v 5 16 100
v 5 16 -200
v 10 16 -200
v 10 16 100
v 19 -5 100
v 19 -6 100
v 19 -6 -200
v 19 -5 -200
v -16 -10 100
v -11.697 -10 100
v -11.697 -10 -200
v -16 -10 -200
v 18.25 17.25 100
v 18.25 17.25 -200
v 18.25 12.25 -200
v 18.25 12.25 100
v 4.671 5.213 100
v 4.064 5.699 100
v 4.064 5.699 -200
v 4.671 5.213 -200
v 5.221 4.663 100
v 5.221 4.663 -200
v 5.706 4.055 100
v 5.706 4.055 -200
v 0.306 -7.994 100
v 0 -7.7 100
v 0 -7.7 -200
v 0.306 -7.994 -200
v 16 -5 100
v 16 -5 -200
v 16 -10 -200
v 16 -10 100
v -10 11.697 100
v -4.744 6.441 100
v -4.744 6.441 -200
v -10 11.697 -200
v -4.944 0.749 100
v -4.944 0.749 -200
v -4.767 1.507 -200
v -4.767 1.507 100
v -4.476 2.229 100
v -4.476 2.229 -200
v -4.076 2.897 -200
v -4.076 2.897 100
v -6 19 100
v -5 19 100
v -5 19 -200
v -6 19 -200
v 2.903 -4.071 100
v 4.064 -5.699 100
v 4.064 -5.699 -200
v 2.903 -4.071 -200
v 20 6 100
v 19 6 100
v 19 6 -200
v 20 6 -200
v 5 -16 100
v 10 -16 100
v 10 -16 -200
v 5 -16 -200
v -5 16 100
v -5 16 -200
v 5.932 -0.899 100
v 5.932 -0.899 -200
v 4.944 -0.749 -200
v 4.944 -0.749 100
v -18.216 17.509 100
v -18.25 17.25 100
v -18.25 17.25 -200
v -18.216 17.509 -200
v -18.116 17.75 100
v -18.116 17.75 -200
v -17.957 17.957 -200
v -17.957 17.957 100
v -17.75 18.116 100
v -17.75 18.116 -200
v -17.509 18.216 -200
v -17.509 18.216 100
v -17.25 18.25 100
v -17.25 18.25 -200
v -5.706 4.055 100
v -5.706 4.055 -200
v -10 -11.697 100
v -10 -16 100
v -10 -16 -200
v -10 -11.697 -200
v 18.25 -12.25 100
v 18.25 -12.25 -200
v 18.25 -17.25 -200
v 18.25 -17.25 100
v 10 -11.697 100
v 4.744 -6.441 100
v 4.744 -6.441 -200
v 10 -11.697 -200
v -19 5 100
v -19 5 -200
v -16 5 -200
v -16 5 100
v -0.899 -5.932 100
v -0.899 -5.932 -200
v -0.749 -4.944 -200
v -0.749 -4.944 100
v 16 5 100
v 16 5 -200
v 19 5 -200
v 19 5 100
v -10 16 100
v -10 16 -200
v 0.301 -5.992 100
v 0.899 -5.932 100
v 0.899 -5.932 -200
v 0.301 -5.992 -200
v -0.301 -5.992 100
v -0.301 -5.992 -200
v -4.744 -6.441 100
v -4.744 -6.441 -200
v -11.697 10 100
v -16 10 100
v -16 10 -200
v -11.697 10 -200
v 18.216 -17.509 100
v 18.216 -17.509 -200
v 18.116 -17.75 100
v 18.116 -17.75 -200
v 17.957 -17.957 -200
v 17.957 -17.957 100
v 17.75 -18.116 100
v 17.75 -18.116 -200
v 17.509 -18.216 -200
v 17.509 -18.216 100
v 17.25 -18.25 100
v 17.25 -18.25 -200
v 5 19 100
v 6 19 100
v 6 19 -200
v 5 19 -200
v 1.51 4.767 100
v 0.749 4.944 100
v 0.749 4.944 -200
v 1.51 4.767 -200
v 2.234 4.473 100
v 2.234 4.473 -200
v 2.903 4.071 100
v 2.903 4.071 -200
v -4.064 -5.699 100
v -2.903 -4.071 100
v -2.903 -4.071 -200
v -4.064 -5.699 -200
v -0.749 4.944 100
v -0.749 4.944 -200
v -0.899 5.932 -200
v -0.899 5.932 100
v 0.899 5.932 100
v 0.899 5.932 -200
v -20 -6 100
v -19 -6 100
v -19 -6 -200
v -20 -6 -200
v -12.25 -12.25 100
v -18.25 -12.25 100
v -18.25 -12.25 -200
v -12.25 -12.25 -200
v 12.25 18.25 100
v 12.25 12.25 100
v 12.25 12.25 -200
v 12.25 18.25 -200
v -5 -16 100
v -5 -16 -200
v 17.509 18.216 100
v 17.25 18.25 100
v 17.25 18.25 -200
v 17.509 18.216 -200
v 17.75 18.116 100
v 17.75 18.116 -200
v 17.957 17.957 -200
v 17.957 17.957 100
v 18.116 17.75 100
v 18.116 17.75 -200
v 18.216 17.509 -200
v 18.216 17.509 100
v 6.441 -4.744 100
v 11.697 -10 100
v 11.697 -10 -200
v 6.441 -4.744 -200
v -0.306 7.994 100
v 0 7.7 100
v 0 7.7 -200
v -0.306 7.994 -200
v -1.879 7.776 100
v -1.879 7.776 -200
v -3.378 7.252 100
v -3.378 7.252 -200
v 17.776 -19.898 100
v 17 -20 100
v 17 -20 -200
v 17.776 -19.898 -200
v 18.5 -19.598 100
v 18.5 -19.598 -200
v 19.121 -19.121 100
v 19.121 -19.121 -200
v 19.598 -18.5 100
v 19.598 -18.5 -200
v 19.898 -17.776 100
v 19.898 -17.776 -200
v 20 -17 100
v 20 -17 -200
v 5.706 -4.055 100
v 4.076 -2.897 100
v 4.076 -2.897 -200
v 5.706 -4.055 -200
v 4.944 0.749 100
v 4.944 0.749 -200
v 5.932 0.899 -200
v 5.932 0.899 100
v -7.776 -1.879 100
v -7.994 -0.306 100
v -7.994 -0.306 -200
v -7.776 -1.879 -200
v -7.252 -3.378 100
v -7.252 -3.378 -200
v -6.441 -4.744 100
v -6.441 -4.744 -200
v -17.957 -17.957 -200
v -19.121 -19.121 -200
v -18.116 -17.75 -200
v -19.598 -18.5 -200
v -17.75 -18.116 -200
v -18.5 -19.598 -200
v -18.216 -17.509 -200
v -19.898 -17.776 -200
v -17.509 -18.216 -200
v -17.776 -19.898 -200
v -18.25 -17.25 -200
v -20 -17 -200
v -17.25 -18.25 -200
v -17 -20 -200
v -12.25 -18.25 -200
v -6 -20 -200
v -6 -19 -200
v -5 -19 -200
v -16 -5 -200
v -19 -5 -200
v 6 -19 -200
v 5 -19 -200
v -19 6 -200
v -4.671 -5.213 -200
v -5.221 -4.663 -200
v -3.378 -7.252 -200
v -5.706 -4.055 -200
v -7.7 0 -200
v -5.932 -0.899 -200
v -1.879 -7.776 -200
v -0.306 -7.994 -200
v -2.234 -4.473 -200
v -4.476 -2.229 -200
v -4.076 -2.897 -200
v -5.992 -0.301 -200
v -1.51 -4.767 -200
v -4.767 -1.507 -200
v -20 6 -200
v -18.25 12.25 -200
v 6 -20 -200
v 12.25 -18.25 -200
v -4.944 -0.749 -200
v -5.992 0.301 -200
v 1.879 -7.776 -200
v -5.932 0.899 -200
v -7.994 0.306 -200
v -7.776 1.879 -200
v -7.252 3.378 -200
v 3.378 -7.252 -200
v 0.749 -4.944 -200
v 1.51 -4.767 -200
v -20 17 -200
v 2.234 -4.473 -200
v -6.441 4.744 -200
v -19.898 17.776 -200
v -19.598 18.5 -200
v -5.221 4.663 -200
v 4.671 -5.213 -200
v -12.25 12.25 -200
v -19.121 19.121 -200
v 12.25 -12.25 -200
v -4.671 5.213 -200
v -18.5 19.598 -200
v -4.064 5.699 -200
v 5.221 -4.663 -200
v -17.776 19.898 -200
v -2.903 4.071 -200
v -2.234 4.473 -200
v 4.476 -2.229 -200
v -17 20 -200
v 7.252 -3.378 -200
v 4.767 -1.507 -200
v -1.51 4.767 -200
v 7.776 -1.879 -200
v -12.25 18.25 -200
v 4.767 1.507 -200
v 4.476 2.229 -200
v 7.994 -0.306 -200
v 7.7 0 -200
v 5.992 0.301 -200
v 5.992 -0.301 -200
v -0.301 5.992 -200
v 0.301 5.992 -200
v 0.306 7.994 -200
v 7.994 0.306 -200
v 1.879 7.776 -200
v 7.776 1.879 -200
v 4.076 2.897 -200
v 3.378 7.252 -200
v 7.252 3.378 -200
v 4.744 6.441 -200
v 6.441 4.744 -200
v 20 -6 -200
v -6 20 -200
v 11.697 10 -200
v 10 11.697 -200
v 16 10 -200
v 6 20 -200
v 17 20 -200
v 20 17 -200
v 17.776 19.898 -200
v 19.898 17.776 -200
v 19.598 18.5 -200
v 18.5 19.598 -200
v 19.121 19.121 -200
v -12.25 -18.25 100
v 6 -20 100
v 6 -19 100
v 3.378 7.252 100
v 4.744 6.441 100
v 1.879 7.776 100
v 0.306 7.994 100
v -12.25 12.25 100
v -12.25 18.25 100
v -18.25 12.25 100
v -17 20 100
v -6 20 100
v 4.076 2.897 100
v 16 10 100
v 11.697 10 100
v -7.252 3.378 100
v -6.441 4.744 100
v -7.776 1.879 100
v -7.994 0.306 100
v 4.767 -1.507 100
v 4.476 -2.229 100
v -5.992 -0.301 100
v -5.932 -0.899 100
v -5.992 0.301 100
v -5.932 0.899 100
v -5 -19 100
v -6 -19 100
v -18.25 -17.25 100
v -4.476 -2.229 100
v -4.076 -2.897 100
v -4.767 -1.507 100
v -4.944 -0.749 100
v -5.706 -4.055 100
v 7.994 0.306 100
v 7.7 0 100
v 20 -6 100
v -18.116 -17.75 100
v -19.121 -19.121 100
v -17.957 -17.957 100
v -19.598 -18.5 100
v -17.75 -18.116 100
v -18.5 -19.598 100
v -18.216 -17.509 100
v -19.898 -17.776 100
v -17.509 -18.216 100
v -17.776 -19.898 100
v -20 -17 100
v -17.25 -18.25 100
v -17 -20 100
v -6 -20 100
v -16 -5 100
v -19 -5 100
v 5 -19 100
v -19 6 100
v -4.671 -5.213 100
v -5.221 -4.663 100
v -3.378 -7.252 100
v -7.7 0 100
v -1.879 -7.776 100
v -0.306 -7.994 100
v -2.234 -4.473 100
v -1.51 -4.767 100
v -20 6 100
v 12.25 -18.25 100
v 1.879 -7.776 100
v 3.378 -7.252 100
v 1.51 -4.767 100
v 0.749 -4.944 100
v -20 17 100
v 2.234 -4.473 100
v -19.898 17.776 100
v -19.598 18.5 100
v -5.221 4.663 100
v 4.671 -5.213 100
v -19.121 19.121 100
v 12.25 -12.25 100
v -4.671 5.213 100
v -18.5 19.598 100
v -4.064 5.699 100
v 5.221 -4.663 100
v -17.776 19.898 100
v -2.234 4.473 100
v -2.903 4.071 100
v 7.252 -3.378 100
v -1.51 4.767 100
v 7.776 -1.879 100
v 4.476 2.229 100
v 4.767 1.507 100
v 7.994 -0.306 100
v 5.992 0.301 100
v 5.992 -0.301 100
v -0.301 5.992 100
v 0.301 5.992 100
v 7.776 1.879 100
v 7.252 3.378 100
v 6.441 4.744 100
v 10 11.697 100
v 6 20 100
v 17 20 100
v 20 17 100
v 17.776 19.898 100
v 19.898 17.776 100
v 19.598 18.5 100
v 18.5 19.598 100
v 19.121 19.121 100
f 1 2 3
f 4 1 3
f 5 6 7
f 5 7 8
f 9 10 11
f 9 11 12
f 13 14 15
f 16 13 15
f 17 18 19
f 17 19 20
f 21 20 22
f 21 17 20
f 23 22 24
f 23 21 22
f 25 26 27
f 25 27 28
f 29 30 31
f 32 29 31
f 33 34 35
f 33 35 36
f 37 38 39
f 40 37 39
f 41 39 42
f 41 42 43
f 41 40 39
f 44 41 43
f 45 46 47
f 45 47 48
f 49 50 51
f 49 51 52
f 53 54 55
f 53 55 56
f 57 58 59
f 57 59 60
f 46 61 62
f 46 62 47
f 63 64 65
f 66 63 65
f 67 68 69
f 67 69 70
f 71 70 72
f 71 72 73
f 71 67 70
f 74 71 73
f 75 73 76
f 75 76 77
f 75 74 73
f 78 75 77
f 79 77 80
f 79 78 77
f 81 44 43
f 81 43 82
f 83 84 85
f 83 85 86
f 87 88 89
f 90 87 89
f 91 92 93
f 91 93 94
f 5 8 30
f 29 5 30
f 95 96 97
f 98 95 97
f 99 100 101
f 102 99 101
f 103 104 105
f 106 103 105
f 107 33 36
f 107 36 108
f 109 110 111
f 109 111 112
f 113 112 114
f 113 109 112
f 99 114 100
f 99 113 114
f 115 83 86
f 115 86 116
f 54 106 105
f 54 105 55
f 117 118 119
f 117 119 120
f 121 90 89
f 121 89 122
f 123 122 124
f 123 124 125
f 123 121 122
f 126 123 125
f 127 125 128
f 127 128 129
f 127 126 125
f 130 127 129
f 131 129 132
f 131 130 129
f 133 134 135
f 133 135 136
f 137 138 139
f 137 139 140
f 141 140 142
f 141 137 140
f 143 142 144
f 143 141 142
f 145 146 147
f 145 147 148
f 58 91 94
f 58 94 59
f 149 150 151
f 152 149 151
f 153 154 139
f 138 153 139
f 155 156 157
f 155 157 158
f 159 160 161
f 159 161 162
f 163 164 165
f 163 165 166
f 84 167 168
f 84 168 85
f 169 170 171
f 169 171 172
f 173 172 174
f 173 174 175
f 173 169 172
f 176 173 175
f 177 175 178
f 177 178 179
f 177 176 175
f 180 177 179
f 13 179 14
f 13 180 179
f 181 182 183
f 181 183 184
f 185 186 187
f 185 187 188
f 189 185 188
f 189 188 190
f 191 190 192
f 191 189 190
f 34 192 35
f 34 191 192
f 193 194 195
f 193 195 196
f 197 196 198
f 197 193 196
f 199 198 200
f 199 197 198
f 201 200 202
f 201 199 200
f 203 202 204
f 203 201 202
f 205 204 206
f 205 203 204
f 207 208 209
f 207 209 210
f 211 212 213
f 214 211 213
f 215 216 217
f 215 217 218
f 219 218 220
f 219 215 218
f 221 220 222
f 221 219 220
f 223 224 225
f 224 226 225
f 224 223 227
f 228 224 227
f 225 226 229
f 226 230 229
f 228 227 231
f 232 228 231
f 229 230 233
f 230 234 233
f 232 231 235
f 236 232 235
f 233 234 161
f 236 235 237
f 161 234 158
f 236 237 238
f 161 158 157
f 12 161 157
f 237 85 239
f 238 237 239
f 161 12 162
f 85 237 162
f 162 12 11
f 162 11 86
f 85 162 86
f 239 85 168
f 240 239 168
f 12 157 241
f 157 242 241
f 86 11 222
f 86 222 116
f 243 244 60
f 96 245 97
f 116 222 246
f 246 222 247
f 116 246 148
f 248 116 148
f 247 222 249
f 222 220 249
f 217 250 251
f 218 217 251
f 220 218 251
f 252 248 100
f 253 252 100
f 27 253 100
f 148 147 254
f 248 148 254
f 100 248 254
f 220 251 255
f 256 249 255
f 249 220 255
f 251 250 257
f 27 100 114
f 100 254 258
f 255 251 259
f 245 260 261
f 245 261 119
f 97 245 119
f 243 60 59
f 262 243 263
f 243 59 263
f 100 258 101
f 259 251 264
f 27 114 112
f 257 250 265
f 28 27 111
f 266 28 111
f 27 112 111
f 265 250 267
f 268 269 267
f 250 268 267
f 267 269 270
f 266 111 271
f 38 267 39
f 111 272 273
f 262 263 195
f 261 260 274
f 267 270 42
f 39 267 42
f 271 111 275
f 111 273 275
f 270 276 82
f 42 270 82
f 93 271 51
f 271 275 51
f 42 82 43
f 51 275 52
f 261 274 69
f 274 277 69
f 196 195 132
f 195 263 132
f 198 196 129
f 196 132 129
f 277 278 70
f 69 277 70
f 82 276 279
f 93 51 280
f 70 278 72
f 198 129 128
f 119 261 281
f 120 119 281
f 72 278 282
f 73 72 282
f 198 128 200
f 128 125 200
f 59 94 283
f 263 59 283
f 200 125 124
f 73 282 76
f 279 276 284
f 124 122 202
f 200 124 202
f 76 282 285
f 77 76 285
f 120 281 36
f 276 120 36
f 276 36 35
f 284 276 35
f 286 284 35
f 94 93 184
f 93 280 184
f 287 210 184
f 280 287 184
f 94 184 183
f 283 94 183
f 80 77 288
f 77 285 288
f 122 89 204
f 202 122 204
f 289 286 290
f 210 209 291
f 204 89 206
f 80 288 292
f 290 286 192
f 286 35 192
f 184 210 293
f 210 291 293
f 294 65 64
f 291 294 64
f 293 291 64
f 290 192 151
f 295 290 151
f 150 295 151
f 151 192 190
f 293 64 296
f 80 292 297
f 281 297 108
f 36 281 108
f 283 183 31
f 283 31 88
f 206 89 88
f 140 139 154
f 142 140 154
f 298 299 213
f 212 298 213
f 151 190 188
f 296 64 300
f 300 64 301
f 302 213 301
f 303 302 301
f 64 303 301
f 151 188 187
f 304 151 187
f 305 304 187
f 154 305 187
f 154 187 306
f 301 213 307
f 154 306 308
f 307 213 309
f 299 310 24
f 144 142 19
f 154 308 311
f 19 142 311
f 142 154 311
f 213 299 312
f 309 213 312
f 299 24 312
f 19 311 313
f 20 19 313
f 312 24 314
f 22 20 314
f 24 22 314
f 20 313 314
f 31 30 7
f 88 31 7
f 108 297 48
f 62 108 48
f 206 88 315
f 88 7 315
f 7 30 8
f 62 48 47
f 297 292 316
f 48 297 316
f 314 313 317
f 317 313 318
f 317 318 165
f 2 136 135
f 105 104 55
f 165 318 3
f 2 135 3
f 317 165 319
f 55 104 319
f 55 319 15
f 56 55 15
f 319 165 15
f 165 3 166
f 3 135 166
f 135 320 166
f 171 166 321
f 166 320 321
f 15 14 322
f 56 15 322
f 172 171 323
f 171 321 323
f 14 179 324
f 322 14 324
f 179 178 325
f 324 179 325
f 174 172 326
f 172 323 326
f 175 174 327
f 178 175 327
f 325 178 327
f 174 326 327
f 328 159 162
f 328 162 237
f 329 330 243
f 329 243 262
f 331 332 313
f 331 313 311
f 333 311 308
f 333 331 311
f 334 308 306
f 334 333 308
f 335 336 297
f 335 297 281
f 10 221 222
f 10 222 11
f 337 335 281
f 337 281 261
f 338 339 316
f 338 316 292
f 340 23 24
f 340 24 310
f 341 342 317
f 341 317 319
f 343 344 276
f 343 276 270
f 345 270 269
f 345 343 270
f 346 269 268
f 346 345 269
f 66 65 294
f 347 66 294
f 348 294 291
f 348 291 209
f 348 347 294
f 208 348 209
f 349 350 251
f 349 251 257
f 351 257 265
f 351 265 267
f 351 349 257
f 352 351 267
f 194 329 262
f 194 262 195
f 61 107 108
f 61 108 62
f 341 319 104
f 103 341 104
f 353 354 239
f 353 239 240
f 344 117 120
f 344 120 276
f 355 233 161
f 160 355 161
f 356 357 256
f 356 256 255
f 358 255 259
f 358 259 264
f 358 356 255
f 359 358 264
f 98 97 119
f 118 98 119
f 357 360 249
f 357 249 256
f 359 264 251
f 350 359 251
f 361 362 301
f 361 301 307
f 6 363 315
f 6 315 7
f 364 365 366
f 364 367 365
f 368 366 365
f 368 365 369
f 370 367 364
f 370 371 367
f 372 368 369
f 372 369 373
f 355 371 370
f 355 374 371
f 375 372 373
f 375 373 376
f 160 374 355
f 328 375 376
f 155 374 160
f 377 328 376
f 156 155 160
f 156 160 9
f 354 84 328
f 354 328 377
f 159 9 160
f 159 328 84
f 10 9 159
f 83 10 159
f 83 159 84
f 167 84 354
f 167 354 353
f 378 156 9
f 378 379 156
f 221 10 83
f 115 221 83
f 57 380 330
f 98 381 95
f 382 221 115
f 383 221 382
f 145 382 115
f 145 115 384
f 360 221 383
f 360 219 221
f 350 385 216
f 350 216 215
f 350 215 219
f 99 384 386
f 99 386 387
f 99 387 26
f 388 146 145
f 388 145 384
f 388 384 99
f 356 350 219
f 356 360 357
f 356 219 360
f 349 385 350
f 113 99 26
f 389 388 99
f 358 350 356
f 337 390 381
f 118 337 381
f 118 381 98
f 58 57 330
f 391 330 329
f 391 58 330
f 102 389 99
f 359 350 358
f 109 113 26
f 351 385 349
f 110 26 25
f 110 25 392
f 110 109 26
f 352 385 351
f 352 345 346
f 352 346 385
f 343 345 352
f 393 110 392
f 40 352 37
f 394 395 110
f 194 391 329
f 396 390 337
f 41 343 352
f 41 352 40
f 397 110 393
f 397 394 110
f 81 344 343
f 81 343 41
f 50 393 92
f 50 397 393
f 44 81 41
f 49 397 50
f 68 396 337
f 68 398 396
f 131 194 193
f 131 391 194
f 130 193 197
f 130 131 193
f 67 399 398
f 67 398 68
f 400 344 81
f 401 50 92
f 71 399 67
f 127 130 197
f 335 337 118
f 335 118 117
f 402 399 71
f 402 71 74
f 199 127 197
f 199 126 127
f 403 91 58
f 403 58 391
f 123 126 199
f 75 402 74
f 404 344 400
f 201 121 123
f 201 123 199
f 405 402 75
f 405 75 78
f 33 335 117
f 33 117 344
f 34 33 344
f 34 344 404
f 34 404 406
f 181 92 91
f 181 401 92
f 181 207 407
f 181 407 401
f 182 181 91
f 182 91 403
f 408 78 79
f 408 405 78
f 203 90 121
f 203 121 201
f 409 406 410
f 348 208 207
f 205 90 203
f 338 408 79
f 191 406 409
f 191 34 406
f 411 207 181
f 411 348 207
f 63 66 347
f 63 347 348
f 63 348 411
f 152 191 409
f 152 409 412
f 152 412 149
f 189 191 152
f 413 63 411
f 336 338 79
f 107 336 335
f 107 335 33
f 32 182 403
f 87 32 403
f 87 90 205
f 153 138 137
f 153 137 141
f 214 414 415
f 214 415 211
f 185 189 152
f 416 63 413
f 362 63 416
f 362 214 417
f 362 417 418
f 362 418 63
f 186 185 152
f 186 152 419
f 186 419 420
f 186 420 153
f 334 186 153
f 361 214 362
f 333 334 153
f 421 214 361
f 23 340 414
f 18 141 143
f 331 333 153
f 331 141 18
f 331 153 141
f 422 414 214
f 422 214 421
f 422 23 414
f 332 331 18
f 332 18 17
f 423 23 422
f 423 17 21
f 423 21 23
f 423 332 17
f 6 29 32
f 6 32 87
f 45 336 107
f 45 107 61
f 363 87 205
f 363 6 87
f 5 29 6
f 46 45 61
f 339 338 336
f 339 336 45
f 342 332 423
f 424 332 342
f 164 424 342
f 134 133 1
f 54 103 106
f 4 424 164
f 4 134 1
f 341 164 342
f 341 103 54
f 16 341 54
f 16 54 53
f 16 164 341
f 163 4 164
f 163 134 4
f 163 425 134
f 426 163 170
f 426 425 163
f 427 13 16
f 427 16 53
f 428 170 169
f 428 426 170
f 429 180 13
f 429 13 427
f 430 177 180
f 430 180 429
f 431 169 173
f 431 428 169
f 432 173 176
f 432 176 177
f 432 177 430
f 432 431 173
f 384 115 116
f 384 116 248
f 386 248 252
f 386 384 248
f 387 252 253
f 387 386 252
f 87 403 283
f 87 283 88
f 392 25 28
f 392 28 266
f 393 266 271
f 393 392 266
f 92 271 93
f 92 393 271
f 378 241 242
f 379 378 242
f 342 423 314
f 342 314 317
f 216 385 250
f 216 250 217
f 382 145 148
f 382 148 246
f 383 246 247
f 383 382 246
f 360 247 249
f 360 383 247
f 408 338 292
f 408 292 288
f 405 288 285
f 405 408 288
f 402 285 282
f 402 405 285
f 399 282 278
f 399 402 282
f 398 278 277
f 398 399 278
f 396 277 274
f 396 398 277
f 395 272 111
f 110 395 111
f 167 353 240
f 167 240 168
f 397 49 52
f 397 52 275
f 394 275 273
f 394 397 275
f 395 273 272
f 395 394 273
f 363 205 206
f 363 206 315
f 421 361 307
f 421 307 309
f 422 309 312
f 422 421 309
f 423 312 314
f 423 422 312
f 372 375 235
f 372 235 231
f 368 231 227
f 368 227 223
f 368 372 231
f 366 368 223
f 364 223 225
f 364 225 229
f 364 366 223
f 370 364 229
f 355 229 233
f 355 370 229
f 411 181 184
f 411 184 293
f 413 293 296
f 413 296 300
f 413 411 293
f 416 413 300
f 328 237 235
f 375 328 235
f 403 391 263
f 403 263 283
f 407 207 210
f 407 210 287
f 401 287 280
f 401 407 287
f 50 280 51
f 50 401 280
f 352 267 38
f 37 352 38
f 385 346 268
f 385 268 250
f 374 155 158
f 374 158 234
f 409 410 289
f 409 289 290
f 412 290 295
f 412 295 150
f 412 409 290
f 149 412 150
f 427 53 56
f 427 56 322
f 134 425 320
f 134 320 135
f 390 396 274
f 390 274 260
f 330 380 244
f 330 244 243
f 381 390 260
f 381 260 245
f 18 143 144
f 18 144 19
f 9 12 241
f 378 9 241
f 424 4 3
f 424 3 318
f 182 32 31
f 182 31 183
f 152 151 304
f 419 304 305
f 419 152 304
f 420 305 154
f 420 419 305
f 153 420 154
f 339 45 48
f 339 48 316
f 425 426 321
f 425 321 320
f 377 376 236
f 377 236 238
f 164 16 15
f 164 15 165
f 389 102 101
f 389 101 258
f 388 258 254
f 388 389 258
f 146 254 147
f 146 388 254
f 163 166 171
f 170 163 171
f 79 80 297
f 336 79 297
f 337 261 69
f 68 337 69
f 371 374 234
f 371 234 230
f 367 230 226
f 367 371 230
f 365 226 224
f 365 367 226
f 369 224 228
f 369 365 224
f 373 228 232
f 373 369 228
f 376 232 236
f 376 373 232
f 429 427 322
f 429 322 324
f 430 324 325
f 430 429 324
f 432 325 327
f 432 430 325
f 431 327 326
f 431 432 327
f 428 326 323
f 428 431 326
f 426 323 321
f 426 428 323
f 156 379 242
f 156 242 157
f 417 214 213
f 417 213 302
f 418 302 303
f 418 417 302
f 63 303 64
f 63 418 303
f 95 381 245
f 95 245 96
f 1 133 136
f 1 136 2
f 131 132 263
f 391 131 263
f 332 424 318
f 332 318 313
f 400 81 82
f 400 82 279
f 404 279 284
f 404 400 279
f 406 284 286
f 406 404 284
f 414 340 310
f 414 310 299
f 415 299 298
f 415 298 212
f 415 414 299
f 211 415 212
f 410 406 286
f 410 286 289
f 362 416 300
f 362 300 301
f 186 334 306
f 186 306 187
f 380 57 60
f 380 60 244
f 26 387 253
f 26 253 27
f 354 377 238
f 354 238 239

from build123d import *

# Parameters (mm, degrees)
BOSS_EXTRU_1_DEPTH = 300


with BuildPart() as part:
    # Esquisse1 → Boss.-Extru.1 (new body)
    with BuildSketch(Plane.XY.offset(100)):
        with BuildLine():
            Line((6, -19), (6, -20))
            Line((6, -20), (17, -20))
            ThreePointArc((17, -20), (19.121320344, -19.121320344), (20, -17))
            Line((20, -17), (20, -6))
            Line((20, -6), (19, -6))
            Line((19, -6), (19, -5))
            Line((19, -5), (16, -5))
            Line((16, -5), (16, -10))
            Line((16, -10), (11.697056276, -10))
            Line((11.697056276, -10), (6.44138072, -4.744324444))
            ThreePointArc((6.44138072, -4.744324444), (7.551143817, -2.642011933), (7.994130058, -0.306405969))
            Line((7.994130058, -0.306405969), (7.7, 0))
            Line((7.7, 0), (7.994130058, 0.306405971))
            ThreePointArc((7.994130058, 0.306405971), (7.551143817, 2.642011934), (6.441380719, 4.744324444))
            Line((6.441380719, 4.744324444), (11.697056275, 10))
            Line((11.697056275, 10), (16, 10))
            Line((16, 10), (16, 5))
            Line((16, 5), (19, 5))
            Line((19, 5), (19, 6))
            Line((19, 6), (20, 6))
            Line((20, 6), (20, 17))
            ThreePointArc((20, 17), (19.121320344, 19.121320344), (17, 20))
            Line((17, 20), (6, 20))
            Line((6, 20), (6, 19))
            Line((6, 19), (5, 19))
            Line((5, 19), (5, 15.999999999))
            Line((5, 15.999999999), (10.000000001, 15.999999999))
            Line((10.000000001, 15.999999999), (10.000000001, 11.697056275))
            Line((10.000000001, 11.697056275), (4.744324444, 6.441380719))
            ThreePointArc((4.744324444, 6.441380719), (2.642011933, 7.551143817), (0.306405969, 7.994130058))
            Line((0.306405969, 7.994130058), (0, 7.7))
            Line((0, 7.7), (-0.30640597, 7.994130058))
            ThreePointArc((-0.30640597, 7.994130058), (-2.642011933, 7.551143817), (-4.744324444, 6.441380719))
            Line((-4.744324444, 6.441380719), (-9.999999999, 11.697056274))
            Line((-9.999999999, 11.697056274), (-9.999999999, 15.999999999))
            Line((-9.999999999, 15.999999999), (-5, 15.999999999))
            Line((-5, 15.999999999), (-5, 19))
            Line((-5, 19), (-6, 19))
            Line((-6, 19), (-6, 20))
            Line((-6, 20), (-17, 20))
            ThreePointArc((-17, 20), (-19.121320344, 19.121320344), (-20, 17))
            Line((-20, 17), (-20, 6))
            Line((-20, 6), (-19, 6))
            Line((-19, 6), (-19, 5))
            Line((-19, 5), (-16, 5))
            Line((-16, 5), (-16, 10))
            Line((-16, 10), (-11.697056274, 10))
            Line((-11.697056274, 10), (-6.441380718, 4.744324445))
            ThreePointArc((-6.441380718, 4.744324445), (-7.551143817, 2.642011933), (-7.994130058, 0.306405969))
            Line((-7.994130058, 0.306405969), (-7.699999999, 0))
            Line((-7.699999999, 0), (-7.994130057, -0.306405971))
            ThreePointArc((-7.994130057, -0.306405971), (-7.551143816, -2.642011934), (-6.441380719, -4.744324444))
            Line((-6.441380719, -4.744324444), (-11.697056275, -10))
            Line((-11.697056275, -10), (-16, -10))
            Line((-16, -10), (-16, -5))
            Line((-16, -5), (-19, -5))
            Line((-19, -5), (-19, -6))
            Line((-19, -6), (-20, -6))
            Line((-20, -6), (-20, -17))
            ThreePointArc((-20, -17), (-19.121320344, -19.121320344), (-17, -20))
            Line((-17, -20), (-6, -20))
            Line((-6, -20), (-6, -19))
            Line((-6, -19), (-5, -19))
            Line((-5, -19), (-5, -16.000000001))
            Line((-5, -16.000000001), (-9.999999999, -16.000000001))
            Line((-9.999999999, -16.000000001), (-9.999999999, -11.697056274))
            Line((-9.999999999, -11.697056274), (-4.744324444, -6.441380719))
            ThreePointArc((-4.744324444, -6.441380719), (-2.642011933, -7.551143817), (-0.306405969, -7.994130058))
            Line((-0.306405969, -7.994130058), (0, -7.7))
            Line((0, -7.7), (0.306405971, -7.994130058))
            ThreePointArc((0.306405971, -7.994130058), (2.642011934, -7.551143817), (4.744324445, -6.441380719))
            Line((4.744324445, -6.441380719), (10.000000001, -11.697056274))
            Line((10.000000001, -11.697056274), (10.000000001, -16.000000001))
            Line((10.000000001, -16.000000001), (5, -16.000000001))
            Line((5, -16.000000001), (5, -19))
            Line((5, -19), (6, -19))
        make_face()
        with BuildLine():
            Line((18.25, 12.25), (12.25, 12.25))
            Line((12.25, 12.25), (12.25, 18.25))
            Line((12.25, 18.25), (17.25, 18.25))
            ThreePointArc((17.25, 18.25), (17.957106781, 17.957106781), (18.25, 17.25))
            Line((18.25, 17.25), (18.25, 12.25))
        make_face(mode=Mode.SUBTRACT)
        with BuildLine():
            Line((-18.25, -12.25), (-12.25, -12.25))
            Line((-12.25, -12.25), (-12.25, -18.25))
            Line((-12.25, -18.25), (-17.25, -18.25))
            ThreePointArc((-17.25, -18.25), (-17.957106781, -17.957106781), (-18.25, -17.25))
            Line((-18.25, -17.25), (-18.25, -12.25))
        make_face(mode=Mode.SUBTRACT)
        with BuildLine():
            Line((-12.25, 18.25), (-12.25, 12.25))
            Line((-12.25, 12.25), (-18.25, 12.25))
            Line((-18.25, 12.25), (-18.25, 17.25))
            ThreePointArc((-18.25, 17.25), (-17.957106781, 17.957106781), (-17.25, 18.25))
            Line((-17.25, 18.25), (-12.25, 18.25))
        make_face(mode=Mode.SUBTRACT)
        with BuildLine():
            Line((12.25, -18.25), (12.25, -12.25))
            Line((12.25, -12.25), (18.25, -12.25))
            Line((18.25, -12.25), (18.25, -17.25))
            ThreePointArc((18.25, -17.25), (17.957106781, -17.957106781), (17.25, -18.25))
            Line((17.25, -18.25), (12.25, -18.25))
        make_face(mode=Mode.SUBTRACT)
        with BuildLine():
            Line((-5.705709703, -4.055228326), (-4.075506937, -2.896591666))
            ThreePointArc((-4.075506937, -2.896591666), (-4.635549589, -1.873947727), (-4.943520622, -0.749402378))
            Line((-4.943520622, -0.749402378), (-5.932224738, -0.899282852))
            ThreePointArc((-5.932224738, -0.899282852), (-6, 0), (-5.932224738, 0.899282853))
            Line((-5.932224738, 0.899282853), (-4.943520622, 0.749402379))
            ThreePointArc((-4.943520622, 0.749402379), (-4.635549588, 1.873947727), (-4.075506937, 2.896591666))
            Line((-4.075506937, 2.896591666), (-5.705709704, 4.055228326))
            ThreePointArc((-5.705709704, 4.055228326), (-4.953610357, 4.945881563), (-4.064132573, 5.699370705))
            Line((-4.064132573, 5.699370705), (-2.902951842, 4.070979081))
            ThreePointArc((-2.902951842, 4.070979081), (-1.877566249, 4.634085136), (-0.749402377, 4.943520623))
            Line((-0.749402377, 4.943520623), (-0.899282852, 5.932224739))
            ThreePointArc((-0.899282852, 5.932224739), (0, 6), (0.899282852, 5.932224739))
            Line((0.899282852, 5.932224739), (0.749402377, 4.943520623))
            ThreePointArc((0.749402377, 4.943520623), (1.87756625, 4.634085136), (2.902951843, 4.07097908))
            Line((2.902951843, 4.07097908), (4.064132575, 5.699370704))
            ThreePointArc((4.064132575, 5.699370704), (4.953610358, 4.945881562), (5.705709704, 4.055228326))
            Line((5.705709704, 4.055228326), (4.075506937, 2.896591666))
            ThreePointArc((4.075506937, 2.896591666), (4.635549589, 1.873947727), (4.943520623, 0.749402378))
            Line((4.943520623, 0.749402378), (5.932224739, 0.899282853))
            ThreePointArc((5.932224739, 0.899282853), (6, 0), (5.932224739, -0.899282853))
            Line((5.932224739, -0.899282853), (4.943520623, -0.749402379))
            ThreePointArc((4.943520623, -0.749402379), (4.635549589, -1.873947727), (4.075506938, -2.896591666))
            Line((4.075506938, -2.896591666), (5.705709704, -4.055228326))
            ThreePointArc((5.705709704, -4.055228326), (4.953610357, -4.945881563), (4.064132573, -5.699370705))
            Line((4.064132573, -5.699370705), (2.902951842, -4.070979081))
            ThreePointArc((2.902951842, -4.070979081), (1.87756625, -4.634085136), (0.749402378, -4.943520623))
            Line((0.749402378, -4.943520623), (0.899282852, -5.932224739))
            ThreePointArc((0.899282852, -5.932224739), (1e-09, -6), (-0.899282851, -5.932224739))
            Line((-0.899282851, -5.932224739), (-0.749402377, -4.943520623))
            ThreePointArc((-0.749402377, -4.943520623), (-1.87756625, -4.634085136), (-2.902951843, -4.07097908))
            Line((-2.902951843, -4.07097908), (-4.064132574, -5.699370704))
            ThreePointArc((-4.064132574, -5.699370704), (-4.953610357, -4.945881562), (-5.705709703, -4.055228326))
        make_face(mode=Mode.SUBTRACT)
    extrude(amount=-BOSS_EXTRU_1_DEPTH)


solid = part.part
